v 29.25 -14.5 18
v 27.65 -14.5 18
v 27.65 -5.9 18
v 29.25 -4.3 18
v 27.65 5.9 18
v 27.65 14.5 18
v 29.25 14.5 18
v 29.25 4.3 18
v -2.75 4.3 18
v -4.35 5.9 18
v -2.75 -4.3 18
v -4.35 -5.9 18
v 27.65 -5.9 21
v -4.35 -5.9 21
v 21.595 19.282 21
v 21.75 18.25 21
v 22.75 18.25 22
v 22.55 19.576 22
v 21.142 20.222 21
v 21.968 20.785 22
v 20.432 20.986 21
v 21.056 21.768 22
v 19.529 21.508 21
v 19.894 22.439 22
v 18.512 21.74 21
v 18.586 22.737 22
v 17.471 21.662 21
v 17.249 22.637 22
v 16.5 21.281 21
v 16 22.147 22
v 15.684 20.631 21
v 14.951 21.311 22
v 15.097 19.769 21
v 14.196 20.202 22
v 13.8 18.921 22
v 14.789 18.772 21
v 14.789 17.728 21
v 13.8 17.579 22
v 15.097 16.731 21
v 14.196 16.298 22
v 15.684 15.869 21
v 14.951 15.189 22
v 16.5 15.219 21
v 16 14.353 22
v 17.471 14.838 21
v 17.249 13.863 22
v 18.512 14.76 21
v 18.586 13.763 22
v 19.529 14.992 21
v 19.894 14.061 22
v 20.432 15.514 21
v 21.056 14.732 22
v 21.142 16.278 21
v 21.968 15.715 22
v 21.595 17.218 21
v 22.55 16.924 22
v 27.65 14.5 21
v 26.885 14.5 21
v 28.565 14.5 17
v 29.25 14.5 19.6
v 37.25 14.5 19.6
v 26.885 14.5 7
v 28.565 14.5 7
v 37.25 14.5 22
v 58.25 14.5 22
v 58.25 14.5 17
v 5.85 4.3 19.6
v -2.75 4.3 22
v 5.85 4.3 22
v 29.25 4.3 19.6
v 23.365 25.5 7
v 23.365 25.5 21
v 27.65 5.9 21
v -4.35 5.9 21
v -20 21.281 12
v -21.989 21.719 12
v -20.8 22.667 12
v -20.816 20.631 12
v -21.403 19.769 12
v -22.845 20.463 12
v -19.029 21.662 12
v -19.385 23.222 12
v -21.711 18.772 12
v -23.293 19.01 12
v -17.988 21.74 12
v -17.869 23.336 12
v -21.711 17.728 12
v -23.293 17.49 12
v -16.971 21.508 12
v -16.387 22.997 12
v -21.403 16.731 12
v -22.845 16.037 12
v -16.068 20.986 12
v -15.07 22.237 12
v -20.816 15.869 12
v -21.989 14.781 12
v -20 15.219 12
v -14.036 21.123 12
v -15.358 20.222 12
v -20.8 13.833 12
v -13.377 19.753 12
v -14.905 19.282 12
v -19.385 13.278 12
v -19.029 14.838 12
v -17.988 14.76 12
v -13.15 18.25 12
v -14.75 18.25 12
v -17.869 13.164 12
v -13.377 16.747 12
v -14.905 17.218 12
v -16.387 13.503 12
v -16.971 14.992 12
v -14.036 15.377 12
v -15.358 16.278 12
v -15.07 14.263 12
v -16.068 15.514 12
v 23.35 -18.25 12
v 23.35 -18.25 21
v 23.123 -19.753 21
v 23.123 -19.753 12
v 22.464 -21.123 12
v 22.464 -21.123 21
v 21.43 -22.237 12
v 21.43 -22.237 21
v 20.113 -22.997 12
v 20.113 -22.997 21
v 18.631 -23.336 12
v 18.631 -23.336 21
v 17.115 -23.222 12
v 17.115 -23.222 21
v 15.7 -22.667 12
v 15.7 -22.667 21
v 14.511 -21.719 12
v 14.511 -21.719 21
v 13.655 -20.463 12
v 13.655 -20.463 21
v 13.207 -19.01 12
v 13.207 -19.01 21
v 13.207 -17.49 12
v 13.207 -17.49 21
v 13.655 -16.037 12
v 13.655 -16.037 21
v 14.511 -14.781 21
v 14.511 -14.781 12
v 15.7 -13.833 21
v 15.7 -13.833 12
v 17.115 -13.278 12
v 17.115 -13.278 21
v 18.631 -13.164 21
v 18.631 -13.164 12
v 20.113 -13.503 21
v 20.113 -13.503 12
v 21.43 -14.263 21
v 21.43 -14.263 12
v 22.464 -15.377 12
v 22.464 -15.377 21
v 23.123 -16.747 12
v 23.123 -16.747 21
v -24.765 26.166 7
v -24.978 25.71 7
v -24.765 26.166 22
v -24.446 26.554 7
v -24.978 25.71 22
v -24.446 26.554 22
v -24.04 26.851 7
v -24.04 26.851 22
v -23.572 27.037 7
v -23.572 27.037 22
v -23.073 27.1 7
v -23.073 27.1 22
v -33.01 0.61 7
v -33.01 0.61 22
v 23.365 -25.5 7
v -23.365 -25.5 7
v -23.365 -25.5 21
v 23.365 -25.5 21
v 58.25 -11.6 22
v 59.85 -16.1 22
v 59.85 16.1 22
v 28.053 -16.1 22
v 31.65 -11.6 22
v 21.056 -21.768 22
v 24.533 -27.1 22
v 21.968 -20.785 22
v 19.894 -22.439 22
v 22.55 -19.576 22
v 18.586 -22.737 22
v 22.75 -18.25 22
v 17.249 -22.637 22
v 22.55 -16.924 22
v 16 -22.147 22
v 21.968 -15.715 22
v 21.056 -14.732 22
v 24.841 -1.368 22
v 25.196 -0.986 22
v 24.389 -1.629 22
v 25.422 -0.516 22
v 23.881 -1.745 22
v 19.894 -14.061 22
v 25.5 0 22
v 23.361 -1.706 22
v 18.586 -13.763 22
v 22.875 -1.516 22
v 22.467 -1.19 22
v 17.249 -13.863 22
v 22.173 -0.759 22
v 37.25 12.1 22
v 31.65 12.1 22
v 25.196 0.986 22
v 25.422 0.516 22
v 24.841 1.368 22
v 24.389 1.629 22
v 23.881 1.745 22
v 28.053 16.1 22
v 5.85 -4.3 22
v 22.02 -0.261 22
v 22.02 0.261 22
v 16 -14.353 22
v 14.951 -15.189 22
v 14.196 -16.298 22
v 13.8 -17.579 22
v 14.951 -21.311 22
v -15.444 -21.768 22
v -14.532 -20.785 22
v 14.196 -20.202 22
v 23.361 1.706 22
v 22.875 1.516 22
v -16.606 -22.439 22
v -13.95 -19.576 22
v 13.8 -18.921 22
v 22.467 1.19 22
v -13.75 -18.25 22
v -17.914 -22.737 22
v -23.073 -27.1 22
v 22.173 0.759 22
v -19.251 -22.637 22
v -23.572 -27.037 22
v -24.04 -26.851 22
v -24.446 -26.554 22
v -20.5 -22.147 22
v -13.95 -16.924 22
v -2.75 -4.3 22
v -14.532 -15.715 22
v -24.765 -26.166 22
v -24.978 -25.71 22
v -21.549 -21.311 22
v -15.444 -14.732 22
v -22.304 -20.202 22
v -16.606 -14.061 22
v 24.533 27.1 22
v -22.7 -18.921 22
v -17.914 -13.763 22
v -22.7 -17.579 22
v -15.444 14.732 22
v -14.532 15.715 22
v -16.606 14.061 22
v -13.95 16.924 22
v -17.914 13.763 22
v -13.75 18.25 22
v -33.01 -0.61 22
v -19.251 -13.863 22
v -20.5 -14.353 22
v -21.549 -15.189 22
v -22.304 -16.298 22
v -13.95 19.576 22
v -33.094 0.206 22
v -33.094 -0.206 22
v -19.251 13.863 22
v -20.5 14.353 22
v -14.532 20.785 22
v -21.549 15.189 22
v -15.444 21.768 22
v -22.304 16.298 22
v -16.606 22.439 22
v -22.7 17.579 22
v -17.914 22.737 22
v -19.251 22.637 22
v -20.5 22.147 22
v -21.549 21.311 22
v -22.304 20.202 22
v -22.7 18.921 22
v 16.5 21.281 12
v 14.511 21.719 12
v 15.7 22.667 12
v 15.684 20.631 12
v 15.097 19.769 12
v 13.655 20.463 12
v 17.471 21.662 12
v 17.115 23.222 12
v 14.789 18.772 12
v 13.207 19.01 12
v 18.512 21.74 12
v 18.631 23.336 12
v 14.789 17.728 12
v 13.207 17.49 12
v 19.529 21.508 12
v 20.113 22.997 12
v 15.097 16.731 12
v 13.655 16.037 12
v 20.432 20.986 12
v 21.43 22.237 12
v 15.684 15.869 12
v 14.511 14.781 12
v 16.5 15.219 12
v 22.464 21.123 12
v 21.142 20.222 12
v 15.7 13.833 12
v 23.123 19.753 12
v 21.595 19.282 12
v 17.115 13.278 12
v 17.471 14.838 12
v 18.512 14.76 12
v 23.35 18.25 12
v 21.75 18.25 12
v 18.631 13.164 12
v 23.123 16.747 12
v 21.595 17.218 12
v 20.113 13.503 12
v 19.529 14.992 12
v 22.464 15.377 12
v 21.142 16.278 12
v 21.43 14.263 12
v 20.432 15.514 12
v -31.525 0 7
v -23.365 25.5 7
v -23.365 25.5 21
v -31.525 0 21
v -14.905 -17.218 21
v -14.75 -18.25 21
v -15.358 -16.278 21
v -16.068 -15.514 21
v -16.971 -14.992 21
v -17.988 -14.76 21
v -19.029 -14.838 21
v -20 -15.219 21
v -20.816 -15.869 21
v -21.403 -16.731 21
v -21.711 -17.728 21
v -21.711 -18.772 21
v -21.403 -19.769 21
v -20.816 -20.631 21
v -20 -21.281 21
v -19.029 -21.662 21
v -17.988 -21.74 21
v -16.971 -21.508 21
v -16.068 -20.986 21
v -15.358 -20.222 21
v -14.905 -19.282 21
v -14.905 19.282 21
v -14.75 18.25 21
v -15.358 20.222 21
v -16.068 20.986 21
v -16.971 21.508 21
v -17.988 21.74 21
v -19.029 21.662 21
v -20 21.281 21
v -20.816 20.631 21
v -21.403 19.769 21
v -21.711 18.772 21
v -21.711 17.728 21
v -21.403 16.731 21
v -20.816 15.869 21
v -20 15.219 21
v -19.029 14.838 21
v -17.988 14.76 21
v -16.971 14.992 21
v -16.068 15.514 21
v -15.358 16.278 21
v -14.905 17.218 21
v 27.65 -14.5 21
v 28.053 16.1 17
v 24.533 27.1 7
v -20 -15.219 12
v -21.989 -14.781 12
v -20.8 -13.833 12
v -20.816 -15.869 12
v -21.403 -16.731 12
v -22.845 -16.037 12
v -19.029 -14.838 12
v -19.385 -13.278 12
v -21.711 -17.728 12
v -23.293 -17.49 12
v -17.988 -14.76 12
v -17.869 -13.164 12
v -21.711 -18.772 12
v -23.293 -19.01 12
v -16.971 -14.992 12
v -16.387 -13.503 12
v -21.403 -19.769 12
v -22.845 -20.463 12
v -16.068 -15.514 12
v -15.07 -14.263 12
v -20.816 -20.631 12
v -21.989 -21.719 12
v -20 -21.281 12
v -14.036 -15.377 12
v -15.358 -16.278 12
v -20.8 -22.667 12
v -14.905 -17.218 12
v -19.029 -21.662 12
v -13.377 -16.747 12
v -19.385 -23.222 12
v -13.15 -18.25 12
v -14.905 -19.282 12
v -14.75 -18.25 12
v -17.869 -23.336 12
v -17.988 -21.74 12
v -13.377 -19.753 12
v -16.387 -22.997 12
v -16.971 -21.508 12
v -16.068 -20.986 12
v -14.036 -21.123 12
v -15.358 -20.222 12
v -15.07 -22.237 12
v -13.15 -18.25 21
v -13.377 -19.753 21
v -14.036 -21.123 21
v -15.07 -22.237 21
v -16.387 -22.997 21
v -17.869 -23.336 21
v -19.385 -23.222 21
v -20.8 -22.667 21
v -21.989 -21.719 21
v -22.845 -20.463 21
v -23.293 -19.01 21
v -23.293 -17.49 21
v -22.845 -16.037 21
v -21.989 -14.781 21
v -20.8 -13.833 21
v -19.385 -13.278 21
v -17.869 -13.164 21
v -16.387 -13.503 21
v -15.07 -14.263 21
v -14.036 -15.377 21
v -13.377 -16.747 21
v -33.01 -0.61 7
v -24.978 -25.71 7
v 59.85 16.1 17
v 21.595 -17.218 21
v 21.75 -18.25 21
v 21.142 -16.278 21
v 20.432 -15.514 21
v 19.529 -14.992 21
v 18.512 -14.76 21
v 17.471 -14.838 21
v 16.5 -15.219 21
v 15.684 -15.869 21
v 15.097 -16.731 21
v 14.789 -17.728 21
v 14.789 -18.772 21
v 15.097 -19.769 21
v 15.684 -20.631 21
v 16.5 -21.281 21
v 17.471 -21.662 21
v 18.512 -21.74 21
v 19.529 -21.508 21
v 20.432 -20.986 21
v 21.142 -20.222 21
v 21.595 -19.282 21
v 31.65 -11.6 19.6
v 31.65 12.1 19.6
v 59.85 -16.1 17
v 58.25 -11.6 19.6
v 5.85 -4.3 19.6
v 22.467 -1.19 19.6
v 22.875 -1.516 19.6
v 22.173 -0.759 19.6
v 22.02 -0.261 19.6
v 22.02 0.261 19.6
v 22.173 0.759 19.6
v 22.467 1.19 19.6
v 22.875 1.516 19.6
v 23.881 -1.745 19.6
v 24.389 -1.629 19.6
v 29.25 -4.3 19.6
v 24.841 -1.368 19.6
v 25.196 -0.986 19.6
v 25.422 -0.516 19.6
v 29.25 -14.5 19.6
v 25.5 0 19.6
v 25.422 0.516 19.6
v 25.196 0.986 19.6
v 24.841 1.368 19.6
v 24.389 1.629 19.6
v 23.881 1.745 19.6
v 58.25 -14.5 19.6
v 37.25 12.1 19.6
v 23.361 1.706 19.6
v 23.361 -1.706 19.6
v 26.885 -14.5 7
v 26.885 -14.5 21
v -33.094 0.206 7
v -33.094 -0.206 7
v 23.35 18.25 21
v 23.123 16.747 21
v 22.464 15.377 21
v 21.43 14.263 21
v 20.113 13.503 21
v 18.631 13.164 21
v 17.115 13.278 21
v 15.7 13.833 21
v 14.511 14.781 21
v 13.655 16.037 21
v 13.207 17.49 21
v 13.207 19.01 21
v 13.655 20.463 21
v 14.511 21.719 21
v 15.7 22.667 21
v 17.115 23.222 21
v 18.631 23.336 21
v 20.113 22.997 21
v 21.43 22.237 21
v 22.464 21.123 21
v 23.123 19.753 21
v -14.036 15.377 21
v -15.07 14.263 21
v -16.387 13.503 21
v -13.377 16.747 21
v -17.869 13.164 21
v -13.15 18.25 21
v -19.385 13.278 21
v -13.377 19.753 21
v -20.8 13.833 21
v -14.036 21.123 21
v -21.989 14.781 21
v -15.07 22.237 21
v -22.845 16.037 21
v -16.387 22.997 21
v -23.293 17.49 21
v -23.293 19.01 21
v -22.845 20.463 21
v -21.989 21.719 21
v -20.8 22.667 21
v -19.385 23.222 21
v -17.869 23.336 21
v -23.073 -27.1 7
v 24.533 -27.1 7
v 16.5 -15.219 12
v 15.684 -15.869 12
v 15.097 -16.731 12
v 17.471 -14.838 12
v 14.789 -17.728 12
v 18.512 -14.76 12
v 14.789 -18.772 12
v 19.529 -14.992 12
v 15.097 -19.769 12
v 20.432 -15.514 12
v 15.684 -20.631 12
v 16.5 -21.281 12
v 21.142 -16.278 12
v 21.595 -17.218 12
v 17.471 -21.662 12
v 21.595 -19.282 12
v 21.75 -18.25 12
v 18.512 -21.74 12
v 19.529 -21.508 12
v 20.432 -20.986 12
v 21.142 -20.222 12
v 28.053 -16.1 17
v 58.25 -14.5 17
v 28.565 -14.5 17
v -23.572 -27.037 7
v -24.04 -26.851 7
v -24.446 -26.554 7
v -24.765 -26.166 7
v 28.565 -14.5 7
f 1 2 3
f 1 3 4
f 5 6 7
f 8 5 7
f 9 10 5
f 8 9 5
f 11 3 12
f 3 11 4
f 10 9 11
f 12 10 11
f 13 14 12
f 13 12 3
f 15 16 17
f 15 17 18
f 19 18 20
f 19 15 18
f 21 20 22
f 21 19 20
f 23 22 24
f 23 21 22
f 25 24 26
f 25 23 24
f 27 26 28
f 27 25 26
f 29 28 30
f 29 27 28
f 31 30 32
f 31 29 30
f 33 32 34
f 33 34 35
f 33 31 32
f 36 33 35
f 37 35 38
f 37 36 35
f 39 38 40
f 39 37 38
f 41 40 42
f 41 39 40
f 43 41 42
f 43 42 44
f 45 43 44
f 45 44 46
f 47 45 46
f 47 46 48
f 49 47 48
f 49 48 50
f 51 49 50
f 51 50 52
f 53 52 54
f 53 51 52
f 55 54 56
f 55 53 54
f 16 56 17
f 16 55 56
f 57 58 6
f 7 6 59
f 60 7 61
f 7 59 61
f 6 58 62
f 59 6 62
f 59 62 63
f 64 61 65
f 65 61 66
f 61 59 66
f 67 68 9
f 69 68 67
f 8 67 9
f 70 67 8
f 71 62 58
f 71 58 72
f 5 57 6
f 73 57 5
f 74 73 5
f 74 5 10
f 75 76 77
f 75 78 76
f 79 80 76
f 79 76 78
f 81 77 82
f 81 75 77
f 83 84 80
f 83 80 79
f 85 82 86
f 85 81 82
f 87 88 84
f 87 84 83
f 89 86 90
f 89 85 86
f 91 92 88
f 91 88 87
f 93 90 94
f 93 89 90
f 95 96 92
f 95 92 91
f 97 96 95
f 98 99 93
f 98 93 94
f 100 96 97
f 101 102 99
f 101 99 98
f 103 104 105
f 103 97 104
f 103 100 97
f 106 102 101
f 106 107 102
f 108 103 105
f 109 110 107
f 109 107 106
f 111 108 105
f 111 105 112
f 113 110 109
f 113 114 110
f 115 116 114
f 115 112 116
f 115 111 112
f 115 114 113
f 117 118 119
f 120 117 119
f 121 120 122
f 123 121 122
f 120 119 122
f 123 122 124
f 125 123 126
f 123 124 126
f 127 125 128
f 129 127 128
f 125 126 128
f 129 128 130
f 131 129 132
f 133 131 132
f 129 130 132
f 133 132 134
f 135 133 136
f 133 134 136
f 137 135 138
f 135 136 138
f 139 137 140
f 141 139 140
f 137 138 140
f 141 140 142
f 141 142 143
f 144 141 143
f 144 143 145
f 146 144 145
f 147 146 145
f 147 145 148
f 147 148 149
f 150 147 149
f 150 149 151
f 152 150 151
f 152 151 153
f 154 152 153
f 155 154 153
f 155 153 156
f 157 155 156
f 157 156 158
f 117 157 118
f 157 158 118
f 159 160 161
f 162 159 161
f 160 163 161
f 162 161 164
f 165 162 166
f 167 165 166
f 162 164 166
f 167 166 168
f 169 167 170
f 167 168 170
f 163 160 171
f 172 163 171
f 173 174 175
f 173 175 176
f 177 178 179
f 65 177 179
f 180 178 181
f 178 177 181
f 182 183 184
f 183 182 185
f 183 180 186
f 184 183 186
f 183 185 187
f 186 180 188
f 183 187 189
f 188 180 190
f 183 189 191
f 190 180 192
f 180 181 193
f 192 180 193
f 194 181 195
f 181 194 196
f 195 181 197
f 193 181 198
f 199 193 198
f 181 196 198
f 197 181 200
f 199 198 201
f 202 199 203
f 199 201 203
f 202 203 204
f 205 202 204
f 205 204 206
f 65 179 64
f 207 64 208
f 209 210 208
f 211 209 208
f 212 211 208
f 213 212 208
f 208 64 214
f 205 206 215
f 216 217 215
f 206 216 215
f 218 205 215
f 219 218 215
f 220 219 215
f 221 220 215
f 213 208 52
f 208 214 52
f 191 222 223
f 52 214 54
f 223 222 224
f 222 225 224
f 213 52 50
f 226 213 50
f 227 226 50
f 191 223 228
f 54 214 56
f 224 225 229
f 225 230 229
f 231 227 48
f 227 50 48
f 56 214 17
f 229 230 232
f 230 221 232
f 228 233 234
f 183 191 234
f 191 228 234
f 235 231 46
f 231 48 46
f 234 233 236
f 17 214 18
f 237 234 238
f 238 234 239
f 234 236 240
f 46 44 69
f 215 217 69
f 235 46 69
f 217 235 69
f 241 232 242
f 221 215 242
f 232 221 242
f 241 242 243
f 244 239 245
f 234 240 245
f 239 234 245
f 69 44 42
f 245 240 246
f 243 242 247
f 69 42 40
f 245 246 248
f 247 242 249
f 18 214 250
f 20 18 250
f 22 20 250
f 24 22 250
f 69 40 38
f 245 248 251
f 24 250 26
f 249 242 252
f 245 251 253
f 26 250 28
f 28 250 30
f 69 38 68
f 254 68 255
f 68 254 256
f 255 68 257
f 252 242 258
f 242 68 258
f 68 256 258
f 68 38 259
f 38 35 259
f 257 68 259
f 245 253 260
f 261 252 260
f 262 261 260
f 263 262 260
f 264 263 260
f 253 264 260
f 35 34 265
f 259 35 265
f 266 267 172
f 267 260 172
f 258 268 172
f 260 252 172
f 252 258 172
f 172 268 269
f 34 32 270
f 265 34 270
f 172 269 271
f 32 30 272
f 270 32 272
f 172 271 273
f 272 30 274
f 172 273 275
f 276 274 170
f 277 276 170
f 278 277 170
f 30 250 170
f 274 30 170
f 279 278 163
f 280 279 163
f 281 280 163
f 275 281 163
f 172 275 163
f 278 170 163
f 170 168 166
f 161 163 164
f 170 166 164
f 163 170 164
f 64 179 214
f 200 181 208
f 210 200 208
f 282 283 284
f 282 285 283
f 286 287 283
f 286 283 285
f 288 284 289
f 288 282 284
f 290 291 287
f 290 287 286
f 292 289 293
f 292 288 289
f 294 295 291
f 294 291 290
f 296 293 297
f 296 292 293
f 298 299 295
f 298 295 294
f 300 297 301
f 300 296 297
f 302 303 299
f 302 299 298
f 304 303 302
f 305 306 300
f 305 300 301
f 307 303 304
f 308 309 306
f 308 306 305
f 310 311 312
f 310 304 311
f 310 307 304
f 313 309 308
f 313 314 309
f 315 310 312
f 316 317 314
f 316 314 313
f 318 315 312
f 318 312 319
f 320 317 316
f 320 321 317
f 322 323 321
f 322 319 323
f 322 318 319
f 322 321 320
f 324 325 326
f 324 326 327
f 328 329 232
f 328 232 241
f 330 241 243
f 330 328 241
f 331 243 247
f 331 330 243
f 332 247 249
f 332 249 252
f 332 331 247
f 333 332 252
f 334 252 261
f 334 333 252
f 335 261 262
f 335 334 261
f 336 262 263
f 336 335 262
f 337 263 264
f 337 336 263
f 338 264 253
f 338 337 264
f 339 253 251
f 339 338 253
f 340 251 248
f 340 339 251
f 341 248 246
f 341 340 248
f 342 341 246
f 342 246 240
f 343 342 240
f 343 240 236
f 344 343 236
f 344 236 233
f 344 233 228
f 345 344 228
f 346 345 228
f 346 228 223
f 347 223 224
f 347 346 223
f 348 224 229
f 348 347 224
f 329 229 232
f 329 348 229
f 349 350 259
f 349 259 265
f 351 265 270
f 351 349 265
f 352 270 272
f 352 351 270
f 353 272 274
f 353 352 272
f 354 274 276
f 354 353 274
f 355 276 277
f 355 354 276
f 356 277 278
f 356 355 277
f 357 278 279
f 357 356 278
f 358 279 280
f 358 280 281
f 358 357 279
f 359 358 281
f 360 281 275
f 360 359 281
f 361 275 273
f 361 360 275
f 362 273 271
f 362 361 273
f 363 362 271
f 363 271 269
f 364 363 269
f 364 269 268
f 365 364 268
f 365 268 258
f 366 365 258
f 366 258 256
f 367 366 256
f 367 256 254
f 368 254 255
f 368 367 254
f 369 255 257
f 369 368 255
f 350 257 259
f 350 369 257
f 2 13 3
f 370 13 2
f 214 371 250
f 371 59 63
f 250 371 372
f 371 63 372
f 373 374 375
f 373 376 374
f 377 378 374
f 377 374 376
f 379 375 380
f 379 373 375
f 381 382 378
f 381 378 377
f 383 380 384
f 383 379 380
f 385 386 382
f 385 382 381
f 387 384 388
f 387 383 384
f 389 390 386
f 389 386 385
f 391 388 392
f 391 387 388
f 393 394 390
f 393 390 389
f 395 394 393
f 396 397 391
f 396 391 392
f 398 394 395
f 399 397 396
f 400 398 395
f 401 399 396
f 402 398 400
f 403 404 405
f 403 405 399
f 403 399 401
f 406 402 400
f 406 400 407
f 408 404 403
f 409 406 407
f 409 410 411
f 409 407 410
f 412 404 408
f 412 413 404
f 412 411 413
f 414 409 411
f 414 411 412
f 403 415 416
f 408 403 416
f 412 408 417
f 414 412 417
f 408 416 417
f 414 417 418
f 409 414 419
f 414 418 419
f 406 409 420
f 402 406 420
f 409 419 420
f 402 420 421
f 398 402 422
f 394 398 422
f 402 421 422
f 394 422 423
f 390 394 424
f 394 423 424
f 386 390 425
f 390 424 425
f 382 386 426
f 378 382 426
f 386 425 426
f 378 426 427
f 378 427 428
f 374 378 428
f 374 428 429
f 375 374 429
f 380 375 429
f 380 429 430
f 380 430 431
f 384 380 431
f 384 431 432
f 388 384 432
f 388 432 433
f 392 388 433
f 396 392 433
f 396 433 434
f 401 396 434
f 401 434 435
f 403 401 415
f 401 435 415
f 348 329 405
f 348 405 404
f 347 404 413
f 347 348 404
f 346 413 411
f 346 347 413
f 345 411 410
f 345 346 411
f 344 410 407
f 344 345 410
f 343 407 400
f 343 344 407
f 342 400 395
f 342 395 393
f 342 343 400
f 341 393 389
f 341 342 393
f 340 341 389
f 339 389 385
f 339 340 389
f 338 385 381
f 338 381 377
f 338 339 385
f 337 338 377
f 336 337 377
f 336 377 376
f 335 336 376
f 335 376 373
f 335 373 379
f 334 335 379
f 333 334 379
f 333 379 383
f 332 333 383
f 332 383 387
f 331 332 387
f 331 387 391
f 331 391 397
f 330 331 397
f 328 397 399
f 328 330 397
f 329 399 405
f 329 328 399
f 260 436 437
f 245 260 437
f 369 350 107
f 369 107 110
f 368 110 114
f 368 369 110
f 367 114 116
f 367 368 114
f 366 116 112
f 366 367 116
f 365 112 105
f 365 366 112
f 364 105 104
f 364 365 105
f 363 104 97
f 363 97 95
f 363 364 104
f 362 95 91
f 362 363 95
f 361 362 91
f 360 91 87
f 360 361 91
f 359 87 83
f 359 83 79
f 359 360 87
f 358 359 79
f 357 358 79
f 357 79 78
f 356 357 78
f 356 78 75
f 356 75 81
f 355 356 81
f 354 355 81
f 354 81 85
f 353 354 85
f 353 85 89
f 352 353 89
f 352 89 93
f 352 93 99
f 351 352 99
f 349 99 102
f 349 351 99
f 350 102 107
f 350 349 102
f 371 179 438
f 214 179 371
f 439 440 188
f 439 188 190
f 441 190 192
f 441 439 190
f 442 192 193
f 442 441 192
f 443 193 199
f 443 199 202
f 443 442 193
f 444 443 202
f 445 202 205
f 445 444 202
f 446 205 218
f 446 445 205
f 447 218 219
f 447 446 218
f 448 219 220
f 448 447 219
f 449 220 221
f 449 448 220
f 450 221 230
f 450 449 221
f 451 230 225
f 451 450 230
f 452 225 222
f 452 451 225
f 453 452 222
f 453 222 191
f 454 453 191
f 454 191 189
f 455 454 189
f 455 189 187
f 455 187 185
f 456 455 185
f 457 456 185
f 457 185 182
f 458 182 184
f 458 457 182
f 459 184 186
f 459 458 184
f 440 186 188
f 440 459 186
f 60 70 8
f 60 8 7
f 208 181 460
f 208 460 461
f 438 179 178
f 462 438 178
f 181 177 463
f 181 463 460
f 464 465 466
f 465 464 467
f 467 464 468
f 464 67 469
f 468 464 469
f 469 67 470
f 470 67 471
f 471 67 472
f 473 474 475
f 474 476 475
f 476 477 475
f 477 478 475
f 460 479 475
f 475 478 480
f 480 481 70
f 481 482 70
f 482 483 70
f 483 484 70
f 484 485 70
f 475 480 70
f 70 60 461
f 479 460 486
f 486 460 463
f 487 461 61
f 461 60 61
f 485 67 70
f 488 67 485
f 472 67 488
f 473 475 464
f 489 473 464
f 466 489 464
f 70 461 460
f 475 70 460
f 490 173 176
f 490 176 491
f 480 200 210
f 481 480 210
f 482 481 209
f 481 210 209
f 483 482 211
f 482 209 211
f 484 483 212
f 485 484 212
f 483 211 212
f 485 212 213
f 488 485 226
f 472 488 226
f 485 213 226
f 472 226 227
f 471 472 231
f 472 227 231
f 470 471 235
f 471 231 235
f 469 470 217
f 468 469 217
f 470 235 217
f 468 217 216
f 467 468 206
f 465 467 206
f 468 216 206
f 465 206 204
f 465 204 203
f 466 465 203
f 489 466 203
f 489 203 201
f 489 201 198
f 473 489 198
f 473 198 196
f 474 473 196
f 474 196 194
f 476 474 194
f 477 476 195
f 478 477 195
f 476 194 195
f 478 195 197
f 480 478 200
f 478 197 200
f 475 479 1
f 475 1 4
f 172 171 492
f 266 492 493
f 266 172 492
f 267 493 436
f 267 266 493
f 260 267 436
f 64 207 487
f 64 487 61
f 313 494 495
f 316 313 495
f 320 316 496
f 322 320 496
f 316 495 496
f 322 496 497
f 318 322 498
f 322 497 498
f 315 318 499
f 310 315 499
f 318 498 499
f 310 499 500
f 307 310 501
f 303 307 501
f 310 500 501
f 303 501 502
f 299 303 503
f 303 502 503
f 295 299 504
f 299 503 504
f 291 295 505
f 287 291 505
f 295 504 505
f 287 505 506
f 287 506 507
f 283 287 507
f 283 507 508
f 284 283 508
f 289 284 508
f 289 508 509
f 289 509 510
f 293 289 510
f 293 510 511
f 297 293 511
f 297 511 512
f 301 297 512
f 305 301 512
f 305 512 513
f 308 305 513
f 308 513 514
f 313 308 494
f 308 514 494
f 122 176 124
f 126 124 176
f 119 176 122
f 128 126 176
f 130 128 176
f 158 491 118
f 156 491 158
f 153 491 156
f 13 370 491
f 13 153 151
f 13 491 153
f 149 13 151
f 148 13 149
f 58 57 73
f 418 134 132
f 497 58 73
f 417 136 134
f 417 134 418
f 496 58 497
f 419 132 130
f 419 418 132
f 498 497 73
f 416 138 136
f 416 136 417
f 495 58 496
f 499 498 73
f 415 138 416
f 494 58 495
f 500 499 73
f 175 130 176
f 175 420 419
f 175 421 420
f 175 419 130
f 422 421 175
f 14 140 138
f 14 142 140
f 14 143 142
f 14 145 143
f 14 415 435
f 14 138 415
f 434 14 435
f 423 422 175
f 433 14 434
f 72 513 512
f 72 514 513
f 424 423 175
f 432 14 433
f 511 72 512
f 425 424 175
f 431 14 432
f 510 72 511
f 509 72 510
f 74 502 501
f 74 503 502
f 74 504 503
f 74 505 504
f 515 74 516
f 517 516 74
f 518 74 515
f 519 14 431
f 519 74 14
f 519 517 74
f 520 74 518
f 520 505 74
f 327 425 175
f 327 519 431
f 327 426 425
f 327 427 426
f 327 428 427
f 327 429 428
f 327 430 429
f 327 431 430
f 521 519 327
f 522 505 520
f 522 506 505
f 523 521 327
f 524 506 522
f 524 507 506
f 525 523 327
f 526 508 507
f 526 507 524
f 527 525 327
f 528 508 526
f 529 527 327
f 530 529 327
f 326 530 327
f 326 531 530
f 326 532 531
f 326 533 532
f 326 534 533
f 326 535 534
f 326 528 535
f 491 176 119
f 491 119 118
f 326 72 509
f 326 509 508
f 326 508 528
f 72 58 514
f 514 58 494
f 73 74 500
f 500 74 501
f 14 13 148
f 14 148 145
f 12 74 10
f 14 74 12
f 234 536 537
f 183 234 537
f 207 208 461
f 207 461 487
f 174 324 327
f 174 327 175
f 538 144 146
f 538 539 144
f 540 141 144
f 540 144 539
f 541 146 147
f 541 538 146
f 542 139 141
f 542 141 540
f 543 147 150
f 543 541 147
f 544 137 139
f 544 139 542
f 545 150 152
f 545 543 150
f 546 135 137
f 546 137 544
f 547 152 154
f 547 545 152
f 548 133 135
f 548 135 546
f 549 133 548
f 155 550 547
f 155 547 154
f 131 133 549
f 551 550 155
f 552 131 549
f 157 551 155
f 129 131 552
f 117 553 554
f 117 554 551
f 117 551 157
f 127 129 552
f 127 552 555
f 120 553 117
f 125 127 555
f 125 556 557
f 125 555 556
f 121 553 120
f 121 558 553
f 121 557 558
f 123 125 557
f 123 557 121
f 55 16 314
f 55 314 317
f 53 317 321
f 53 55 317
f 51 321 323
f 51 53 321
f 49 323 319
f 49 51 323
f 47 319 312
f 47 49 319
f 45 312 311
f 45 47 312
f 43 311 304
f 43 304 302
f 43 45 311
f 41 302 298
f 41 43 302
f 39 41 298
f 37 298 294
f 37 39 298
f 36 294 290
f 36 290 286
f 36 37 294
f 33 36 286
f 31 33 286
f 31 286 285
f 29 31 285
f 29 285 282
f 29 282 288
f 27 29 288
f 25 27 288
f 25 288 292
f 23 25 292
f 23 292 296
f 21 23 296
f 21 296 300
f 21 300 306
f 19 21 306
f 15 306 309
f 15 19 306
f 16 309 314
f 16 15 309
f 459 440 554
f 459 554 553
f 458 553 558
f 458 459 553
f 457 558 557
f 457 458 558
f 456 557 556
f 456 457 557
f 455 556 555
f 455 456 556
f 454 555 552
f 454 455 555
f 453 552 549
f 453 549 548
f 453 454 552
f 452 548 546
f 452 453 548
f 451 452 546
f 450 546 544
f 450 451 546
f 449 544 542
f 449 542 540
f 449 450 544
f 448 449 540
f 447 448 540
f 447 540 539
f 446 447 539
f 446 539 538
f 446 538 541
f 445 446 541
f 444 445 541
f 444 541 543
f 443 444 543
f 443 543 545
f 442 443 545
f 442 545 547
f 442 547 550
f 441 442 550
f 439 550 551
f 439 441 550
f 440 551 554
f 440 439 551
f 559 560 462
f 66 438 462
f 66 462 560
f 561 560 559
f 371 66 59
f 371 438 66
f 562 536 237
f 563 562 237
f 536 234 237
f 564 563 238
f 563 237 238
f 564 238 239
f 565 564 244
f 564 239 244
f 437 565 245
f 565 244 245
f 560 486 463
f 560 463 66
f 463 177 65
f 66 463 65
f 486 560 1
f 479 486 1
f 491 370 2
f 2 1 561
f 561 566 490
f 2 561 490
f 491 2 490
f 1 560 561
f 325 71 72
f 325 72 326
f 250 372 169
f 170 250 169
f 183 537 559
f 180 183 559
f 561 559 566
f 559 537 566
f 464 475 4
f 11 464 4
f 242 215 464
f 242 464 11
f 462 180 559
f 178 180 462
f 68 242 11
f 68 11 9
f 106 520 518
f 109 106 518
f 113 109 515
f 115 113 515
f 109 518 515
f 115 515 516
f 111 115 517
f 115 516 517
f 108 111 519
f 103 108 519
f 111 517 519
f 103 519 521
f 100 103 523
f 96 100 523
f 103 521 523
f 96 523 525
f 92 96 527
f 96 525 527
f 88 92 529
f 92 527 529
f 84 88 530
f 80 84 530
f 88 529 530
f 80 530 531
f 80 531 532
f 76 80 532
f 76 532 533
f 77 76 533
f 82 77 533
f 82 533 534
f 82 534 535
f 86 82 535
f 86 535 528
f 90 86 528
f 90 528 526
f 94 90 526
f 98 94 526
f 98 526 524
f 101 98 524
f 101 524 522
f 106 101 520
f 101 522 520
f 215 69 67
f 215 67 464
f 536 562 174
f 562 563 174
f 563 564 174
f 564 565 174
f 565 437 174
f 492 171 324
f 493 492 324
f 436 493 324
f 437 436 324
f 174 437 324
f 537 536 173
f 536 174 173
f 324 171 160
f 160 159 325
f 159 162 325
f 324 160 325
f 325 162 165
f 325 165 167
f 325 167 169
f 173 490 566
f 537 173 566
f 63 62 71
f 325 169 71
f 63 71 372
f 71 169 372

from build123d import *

# Parameters (mm, degrees)
BOSS_EXTRUDE1_DEPTH      = 10
BOSS_EXTRUDE1_DEPTH_BACK = 5
BOSS_EXTRUDE2_DEPTH      = 5
CUT_EXTRUDE1_DEPTH       = 68.390151358
BOSS_EXTRUDE3_DEPTH      = 4
SKETCH7_R                = 1.75
BOSS_EXTRUDE4_DEPTH      = 2.4
SKETCH8_R                = 3.5
BOSS_EXTRUDE5_DEPTH      = 1
SKETCH9_R                = 5.1
SKETCH9_R_2              = 3.5
BOSS_EXTRUDE6_DEPTH      = 9
CHAMFER1_SIZE            = 1
FILLET1_R                = 2


with BuildPart() as part:
    # Sketch2 → Boss-Extrude1 (new, two sides: drawn at the far end of the back side and taken through both)
    with BuildSketch(Plane.XY.offset(12).offset(-BOSS_EXTRUDE1_DEPTH_BACK)):
        Polygon((-24.532899998, 27.1), (-33.204899998, 0), (-24.532899998, -27.1), (24.532899998, -27.1), (33.204899998, 0), (24.532899998, 27.1), align=None)
        Polygon((-23.36497619, 25.5), (-31.52497619, 0), (-23.36497619, -25.5), (23.36497619, -25.5), (31.52497619, 0), (23.36497619, 25.5), align=None, mode=Mode.SUBTRACT)
    extrude(amount=BOSS_EXTRUDE1_DEPTH + BOSS_EXTRUDE1_DEPTH_BACK)

    # Sketch3 → Boss-Extrude2 (add)
    with BuildSketch(Plane.XY.offset(22)):
        Polygon((29.75, 16.1), (59.85, 16.1), (59.85, -16.1), (29.75, -16.1), (28.052899998, -16.1), (28.564899998, -14.5), (29.75, -14.5), (58.25, -14.5), (58.25, 14.5), (29.75, 14.5), (28.564899998, 14.5), (28.052899998, 16.1), align=None)
    extrude(amount=-BOSS_EXTRUDE2_DEPTH)

    # Sketch4 → Cut-Extrude1 (cut, through all)
    with BuildSketch(Plane(origin=(0, 0, 7), x_dir=(-1, 0, 0), z_dir=(0, 0, -1))):
        Polygon((-26.88497619, 14.5), (-28.564899998, 14.5), (-33.204899998, 0), (-28.564899998, -14.5), (-26.88497619, -14.5), (-31.52497619, 0), align=None)
    extrude(amount=-CUT_EXTRUDE1_DEPTH, mode=Mode.SUBTRACT)

    # Sketch5 → Boss-Extrude3 (add)
    with BuildSketch(Plane.XY.offset(22)):
        Polygon((29.25, 4.3), (29.25, 14), (29.25, 14.5), (27.65, 14.5), (27.65, 14), (27.65, 5.9), (-4.35, 5.9), (-4.35, -5.9), (27.65, -5.9), (27.65, -14), (27.65, -14.5), (29.25, -14.5), (29.25, -14), (29.25, -4.3), (-2.75, -4.3), (-2.75, 4.3), align=None)
    extrude(amount=-BOSS_EXTRUDE3_DEPTH)

    # Sketch7 → Boss-Extrude4 (add)
    with BuildSketch(Plane.XY.offset(22)):
        Polygon((37.25, 12.1), (37.25, 14.5), (29.25, 14.5), (29.25, 4.3), (5.85, 4.3), (5.85, -4.3), (29.25, -4.3), (29.25, -14.5), (58.25, -14.5), (58.25, -11.6), (31.65, -11.6), (31.65, 12.1), align=None)
        with Locations((23.75, 0)):
            Circle(SKETCH7_R, mode=Mode.SUBTRACT)
    extrude(amount=-BOSS_EXTRUDE4_DEPTH)

    # Sketch8 → Boss-Extrude5 (add)
    with BuildSketch(Plane.XY.offset(22)):
        Polygon((27.65, -5.9), (27.65, -14.5), (26.88497619, -14.5), (23.36497619, -25.5), (-23.36497619, -25.5), (-31.52497619, 0), (-23.36497619, 25.5), (23.36497619, 25.5), (26.88497619, 14.5), (27.65, 14.5), (27.65, 5.9), (-4.35, 5.9), (-4.35, -5.9), align=None)
        with Locations((-18.25, 18.25)):
            Circle(SKETCH8_R, mode=Mode.SUBTRACT)
        with Locations((18.25, 18.25)):
            Circle(SKETCH8_R, mode=Mode.SUBTRACT)
        with Locations((18.25, -18.25)):
            Circle(SKETCH8_R, mode=Mode.SUBTRACT)
        with Locations((-18.25, -18.25)):
            Circle(SKETCH8_R, mode=Mode.SUBTRACT)
    extrude(amount=-BOSS_EXTRUDE5_DEPTH)

    # Sketch9 → Boss-Extrude6 (add)
    # profile 1 of 4: a face of its own
    with BuildSketch(Plane(origin=(0, 0, 21), x_dir=(-1, 0, 0), z_dir=(0, 0, -1))):
        with Locations(Location((-18.25, 18.25, 0), (0, 0, 180))):
            Circle(SKETCH9_R)
        with Locations(Location((-18.25, 18.25, 0), (0, 0, 180))):
            Circle(SKETCH9_R_2, mode=Mode.SUBTRACT)
    # profile 2 of 4: a face of its own
    with BuildSketch(Plane(origin=(0, 0, 21), x_dir=(-1, 0, 0), z_dir=(0, 0, -1))):
        with Locations(Location((18.25, 18.25, 0), (0, 0, 180))):
            Circle(SKETCH9_R)
        with Locations(Location((18.25, 18.25, 0), (0, 0, 180))):
            Circle(SKETCH9_R_2, mode=Mode.SUBTRACT)
    # profile 3 of 4: a face of its own
    with BuildSketch(Plane(origin=(0, 0, 21), x_dir=(-1, 0, 0), z_dir=(0, 0, -1))):
        with Locations(Location((18.25, -18.25, 0), (0, 0, 180))):
            Circle(SKETCH9_R)
        with Locations(Location((18.25, -18.25, 0), (0, 0, 180))):
            Circle(SKETCH9_R_2, mode=Mode.SUBTRACT)
    # profile 4 of 4: a face of its own
    with BuildSketch(Plane(origin=(0, 0, 21), x_dir=(-1, 0, 0), z_dir=(0, 0, -1))):
        with Locations(Location((-18.25, -18.25, 0), (0, 0, 180))):
            Circle(SKETCH9_R)
        with Locations(Location((-18.25, -18.25, 0), (0, 0, 180))):
            Circle(SKETCH9_R_2, mode=Mode.SUBTRACT)
    extrude(amount=BOSS_EXTRUDE6_DEPTH)

    # Chamfer1
    chamfer1_edges = [part.edges().sort_by_distance(p)[0] for p in [
        (-21.75, -18.25, 22),
        (14.75, -18.25, 22),
        (14.75, 18.25, 22),
        (-21.75, 18.25, 22),
    ]]
    chamfer(chamfer1_edges, length=CHAMFER1_SIZE - 0.0001)  # a hair under: the kernel refuses the full size

    # Fillet1
    fillet1_edges = [part.edges().sort_by_distance(p)[0] for p in [
        (-24.532899998, -27.1, 14.5),
        (-33.204899998, 0, 14.5),
        (-24.532899998, 27.1, 14.5),
    ]]
    fillet(fillet1_edges, radius=FILLET1_R)


solid = part.part
